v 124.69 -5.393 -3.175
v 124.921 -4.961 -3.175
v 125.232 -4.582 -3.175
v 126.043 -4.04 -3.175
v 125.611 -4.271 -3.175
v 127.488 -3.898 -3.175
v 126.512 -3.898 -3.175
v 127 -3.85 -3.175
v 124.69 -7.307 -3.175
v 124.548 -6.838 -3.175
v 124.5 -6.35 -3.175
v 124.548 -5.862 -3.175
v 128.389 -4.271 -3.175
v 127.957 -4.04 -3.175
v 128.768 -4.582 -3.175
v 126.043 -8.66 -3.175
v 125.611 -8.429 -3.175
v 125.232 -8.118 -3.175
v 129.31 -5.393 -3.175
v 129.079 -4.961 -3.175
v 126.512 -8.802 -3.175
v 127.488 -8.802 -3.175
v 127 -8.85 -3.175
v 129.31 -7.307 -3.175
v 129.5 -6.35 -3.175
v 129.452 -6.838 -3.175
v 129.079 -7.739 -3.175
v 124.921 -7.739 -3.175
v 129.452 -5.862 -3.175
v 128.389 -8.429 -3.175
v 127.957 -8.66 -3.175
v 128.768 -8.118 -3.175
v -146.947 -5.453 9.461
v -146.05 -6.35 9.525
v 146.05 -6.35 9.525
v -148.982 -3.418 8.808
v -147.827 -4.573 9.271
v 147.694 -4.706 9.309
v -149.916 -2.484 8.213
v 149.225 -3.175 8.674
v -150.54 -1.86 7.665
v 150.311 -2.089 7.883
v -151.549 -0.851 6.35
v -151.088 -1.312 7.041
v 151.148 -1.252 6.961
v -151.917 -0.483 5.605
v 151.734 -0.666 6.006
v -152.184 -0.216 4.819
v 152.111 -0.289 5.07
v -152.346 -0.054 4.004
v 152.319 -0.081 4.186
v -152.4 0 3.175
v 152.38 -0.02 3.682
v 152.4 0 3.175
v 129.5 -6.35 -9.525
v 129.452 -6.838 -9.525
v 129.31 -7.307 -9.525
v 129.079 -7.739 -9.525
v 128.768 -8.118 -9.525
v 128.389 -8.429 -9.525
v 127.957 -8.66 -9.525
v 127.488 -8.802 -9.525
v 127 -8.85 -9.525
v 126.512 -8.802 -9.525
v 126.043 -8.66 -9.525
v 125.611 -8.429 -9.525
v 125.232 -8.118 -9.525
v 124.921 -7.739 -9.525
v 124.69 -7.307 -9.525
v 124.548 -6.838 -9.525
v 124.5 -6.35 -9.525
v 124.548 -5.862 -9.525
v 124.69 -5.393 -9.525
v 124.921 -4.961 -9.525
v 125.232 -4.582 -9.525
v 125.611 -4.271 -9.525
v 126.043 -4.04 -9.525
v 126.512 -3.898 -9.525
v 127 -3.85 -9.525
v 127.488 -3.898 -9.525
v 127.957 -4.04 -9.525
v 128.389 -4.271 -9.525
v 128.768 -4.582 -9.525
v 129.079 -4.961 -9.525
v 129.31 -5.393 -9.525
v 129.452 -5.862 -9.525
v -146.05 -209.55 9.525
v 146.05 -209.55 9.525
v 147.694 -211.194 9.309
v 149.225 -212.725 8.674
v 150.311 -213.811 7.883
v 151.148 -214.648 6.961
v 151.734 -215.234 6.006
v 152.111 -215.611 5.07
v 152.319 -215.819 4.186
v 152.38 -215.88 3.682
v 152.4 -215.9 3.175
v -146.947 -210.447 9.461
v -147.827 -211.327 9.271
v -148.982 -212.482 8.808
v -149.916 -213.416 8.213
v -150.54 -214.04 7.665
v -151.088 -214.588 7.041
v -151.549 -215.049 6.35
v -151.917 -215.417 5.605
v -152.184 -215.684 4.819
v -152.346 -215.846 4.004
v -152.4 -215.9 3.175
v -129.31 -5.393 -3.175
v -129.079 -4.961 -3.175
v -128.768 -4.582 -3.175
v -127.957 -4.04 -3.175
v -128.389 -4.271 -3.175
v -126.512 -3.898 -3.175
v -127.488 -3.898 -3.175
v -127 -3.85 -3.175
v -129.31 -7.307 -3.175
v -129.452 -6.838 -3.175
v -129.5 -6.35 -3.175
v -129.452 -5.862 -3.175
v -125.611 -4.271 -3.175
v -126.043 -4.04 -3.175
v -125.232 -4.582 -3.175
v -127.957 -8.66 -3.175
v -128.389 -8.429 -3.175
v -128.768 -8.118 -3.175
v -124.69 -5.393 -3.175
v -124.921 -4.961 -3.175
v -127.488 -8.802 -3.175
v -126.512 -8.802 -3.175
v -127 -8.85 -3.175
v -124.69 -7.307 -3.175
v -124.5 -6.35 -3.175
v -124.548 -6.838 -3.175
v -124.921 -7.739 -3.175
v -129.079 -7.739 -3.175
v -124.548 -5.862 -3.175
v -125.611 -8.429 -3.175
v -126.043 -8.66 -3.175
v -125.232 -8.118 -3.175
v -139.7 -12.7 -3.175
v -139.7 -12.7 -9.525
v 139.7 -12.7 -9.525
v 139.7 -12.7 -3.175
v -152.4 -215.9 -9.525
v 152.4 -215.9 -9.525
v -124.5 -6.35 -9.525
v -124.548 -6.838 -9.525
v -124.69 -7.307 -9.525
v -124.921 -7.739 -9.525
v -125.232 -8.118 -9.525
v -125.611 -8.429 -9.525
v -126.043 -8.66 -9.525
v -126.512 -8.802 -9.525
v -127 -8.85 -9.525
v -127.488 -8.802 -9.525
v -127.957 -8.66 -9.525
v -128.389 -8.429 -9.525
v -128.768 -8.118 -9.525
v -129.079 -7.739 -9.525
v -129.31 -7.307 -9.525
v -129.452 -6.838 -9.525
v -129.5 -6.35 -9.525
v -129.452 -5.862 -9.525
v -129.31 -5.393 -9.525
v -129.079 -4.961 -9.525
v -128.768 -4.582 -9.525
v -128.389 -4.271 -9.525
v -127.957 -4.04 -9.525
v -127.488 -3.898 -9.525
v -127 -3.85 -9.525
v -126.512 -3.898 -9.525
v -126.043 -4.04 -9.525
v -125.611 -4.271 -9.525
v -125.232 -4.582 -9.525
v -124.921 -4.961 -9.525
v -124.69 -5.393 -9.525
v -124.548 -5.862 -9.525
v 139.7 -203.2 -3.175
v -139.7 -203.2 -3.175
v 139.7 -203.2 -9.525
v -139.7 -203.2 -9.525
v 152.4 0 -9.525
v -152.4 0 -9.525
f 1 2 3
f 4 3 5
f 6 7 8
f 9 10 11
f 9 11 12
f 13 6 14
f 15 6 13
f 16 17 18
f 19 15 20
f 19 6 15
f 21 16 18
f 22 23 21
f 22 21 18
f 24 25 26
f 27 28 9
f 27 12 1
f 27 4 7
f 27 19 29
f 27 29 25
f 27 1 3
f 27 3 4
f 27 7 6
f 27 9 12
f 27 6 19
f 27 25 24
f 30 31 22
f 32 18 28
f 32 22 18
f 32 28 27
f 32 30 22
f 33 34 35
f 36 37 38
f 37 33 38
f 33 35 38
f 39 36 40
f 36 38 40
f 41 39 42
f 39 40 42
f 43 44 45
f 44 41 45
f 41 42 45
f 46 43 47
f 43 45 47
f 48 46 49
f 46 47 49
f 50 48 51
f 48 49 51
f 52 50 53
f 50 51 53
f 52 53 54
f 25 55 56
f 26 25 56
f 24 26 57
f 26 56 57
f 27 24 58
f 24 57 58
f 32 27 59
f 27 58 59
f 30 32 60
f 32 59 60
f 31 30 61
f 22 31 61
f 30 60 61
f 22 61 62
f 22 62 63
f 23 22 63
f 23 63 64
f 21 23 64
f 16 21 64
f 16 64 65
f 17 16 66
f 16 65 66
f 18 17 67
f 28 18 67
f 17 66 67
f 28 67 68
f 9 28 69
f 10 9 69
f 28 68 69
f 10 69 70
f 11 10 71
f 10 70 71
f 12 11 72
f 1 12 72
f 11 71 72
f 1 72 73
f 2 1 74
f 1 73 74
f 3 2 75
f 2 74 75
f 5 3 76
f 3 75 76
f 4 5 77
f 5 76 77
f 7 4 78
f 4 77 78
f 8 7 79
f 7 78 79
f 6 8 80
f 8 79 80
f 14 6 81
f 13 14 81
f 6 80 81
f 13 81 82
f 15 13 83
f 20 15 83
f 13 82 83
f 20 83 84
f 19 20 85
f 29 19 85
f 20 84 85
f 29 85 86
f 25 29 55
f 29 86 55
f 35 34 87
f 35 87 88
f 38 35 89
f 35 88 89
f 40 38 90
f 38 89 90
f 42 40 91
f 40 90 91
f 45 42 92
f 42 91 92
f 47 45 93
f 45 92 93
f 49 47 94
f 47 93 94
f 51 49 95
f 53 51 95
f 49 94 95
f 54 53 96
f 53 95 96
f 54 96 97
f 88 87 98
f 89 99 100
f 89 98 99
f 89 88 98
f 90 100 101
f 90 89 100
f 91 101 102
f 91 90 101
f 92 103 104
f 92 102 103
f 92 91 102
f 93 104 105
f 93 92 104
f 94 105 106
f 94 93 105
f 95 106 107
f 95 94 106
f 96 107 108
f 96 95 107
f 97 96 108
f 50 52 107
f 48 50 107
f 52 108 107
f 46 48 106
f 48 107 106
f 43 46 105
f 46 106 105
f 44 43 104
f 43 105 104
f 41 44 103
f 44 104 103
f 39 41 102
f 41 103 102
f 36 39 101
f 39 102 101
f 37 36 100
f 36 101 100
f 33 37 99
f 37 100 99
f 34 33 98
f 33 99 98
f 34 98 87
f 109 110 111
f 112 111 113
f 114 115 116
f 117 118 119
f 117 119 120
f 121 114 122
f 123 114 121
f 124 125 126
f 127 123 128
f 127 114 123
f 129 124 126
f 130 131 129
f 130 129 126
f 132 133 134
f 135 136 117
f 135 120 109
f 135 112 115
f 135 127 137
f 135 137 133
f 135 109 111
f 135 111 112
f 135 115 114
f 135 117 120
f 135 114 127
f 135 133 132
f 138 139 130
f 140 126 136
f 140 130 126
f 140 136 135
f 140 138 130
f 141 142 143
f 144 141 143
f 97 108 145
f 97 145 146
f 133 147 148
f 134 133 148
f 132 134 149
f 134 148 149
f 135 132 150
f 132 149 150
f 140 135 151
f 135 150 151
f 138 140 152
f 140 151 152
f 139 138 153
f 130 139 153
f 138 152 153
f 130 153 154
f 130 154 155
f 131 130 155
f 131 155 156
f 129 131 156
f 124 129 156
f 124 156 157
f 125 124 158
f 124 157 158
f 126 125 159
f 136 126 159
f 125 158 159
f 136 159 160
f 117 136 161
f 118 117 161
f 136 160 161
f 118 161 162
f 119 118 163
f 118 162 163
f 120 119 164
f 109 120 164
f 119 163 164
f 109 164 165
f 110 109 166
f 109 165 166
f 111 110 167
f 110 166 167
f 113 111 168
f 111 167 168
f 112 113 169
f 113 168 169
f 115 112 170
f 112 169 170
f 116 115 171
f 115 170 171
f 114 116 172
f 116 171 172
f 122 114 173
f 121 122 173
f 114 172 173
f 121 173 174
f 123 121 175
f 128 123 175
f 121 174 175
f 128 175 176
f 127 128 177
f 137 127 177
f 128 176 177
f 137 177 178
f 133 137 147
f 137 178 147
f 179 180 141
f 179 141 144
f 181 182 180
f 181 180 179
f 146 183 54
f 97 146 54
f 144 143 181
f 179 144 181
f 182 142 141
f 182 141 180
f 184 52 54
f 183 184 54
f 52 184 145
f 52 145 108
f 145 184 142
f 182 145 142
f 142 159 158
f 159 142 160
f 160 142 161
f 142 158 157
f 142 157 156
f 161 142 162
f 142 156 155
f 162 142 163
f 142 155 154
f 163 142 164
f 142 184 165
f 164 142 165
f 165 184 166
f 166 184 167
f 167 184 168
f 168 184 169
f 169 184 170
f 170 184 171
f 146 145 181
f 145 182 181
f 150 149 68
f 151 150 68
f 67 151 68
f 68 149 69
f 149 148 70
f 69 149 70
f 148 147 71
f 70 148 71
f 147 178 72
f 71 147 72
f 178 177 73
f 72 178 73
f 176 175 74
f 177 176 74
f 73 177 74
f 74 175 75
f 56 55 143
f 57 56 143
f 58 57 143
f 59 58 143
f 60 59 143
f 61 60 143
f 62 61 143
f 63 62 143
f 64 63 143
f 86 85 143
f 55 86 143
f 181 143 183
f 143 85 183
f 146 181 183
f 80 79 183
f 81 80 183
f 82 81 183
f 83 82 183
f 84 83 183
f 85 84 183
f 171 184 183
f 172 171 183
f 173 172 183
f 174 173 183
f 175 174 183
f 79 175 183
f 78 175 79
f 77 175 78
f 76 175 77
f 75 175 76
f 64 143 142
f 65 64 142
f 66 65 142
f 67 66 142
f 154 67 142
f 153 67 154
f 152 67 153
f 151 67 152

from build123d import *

# Parameters (mm, degrees)
F0_W     = 304.8
F0_H     = 19.05
F1_DEPTH = 215.9
F2_W     = 279.4
F2_H     = 190.5
F3_DEPTH = 6.35
F4_R     = 6.35
F5_R     = 2.5
F6_DEPTH = 6.35


with BuildPart() as f1:
    # F0 (on Front) → F1 (new body)
    with BuildSketch(Plane.XZ):
        Rectangle(F0_W, F0_H)
    extrude(amount=F1_DEPTH)

    # F2 (on face) → F3 (cut)
    with BuildSketch(Plane(origin=(0, 0, -9.525), x_dir=(1, 0, 0), z_dir=(0, 0, -1))):
        with Locations((0, 107.95)):
            Rectangle(F2_W, F2_H)
    extrude(amount=-F3_DEPTH, mode=Mode.SUBTRACT)

    # F4
    f4_edges = [f1.edges().sort_by_distance(p)[0] for p in [
        (-152.4, -107.95, 9.525),
        (0, -215.9, 9.525),
        (152.4, -107.95, 9.525),
        (0, 0, 9.525),
    ]]
    fillet(f4_edges, radius=F4_R)

    # F5 (on face) → F6 (cut)
    with BuildSketch(Plane(origin=(0, 0, -9.525), x_dir=(1, 0, 0), z_dir=(0, 0, -1))):
        with Locations((127, 6.35)):
            Circle(F5_R)
        with Locations((-127, 6.35)):
            Circle(F5_R)
    extrude(amount=-F6_DEPTH, mode=Mode.SUBTRACT)


solid = f1.part
